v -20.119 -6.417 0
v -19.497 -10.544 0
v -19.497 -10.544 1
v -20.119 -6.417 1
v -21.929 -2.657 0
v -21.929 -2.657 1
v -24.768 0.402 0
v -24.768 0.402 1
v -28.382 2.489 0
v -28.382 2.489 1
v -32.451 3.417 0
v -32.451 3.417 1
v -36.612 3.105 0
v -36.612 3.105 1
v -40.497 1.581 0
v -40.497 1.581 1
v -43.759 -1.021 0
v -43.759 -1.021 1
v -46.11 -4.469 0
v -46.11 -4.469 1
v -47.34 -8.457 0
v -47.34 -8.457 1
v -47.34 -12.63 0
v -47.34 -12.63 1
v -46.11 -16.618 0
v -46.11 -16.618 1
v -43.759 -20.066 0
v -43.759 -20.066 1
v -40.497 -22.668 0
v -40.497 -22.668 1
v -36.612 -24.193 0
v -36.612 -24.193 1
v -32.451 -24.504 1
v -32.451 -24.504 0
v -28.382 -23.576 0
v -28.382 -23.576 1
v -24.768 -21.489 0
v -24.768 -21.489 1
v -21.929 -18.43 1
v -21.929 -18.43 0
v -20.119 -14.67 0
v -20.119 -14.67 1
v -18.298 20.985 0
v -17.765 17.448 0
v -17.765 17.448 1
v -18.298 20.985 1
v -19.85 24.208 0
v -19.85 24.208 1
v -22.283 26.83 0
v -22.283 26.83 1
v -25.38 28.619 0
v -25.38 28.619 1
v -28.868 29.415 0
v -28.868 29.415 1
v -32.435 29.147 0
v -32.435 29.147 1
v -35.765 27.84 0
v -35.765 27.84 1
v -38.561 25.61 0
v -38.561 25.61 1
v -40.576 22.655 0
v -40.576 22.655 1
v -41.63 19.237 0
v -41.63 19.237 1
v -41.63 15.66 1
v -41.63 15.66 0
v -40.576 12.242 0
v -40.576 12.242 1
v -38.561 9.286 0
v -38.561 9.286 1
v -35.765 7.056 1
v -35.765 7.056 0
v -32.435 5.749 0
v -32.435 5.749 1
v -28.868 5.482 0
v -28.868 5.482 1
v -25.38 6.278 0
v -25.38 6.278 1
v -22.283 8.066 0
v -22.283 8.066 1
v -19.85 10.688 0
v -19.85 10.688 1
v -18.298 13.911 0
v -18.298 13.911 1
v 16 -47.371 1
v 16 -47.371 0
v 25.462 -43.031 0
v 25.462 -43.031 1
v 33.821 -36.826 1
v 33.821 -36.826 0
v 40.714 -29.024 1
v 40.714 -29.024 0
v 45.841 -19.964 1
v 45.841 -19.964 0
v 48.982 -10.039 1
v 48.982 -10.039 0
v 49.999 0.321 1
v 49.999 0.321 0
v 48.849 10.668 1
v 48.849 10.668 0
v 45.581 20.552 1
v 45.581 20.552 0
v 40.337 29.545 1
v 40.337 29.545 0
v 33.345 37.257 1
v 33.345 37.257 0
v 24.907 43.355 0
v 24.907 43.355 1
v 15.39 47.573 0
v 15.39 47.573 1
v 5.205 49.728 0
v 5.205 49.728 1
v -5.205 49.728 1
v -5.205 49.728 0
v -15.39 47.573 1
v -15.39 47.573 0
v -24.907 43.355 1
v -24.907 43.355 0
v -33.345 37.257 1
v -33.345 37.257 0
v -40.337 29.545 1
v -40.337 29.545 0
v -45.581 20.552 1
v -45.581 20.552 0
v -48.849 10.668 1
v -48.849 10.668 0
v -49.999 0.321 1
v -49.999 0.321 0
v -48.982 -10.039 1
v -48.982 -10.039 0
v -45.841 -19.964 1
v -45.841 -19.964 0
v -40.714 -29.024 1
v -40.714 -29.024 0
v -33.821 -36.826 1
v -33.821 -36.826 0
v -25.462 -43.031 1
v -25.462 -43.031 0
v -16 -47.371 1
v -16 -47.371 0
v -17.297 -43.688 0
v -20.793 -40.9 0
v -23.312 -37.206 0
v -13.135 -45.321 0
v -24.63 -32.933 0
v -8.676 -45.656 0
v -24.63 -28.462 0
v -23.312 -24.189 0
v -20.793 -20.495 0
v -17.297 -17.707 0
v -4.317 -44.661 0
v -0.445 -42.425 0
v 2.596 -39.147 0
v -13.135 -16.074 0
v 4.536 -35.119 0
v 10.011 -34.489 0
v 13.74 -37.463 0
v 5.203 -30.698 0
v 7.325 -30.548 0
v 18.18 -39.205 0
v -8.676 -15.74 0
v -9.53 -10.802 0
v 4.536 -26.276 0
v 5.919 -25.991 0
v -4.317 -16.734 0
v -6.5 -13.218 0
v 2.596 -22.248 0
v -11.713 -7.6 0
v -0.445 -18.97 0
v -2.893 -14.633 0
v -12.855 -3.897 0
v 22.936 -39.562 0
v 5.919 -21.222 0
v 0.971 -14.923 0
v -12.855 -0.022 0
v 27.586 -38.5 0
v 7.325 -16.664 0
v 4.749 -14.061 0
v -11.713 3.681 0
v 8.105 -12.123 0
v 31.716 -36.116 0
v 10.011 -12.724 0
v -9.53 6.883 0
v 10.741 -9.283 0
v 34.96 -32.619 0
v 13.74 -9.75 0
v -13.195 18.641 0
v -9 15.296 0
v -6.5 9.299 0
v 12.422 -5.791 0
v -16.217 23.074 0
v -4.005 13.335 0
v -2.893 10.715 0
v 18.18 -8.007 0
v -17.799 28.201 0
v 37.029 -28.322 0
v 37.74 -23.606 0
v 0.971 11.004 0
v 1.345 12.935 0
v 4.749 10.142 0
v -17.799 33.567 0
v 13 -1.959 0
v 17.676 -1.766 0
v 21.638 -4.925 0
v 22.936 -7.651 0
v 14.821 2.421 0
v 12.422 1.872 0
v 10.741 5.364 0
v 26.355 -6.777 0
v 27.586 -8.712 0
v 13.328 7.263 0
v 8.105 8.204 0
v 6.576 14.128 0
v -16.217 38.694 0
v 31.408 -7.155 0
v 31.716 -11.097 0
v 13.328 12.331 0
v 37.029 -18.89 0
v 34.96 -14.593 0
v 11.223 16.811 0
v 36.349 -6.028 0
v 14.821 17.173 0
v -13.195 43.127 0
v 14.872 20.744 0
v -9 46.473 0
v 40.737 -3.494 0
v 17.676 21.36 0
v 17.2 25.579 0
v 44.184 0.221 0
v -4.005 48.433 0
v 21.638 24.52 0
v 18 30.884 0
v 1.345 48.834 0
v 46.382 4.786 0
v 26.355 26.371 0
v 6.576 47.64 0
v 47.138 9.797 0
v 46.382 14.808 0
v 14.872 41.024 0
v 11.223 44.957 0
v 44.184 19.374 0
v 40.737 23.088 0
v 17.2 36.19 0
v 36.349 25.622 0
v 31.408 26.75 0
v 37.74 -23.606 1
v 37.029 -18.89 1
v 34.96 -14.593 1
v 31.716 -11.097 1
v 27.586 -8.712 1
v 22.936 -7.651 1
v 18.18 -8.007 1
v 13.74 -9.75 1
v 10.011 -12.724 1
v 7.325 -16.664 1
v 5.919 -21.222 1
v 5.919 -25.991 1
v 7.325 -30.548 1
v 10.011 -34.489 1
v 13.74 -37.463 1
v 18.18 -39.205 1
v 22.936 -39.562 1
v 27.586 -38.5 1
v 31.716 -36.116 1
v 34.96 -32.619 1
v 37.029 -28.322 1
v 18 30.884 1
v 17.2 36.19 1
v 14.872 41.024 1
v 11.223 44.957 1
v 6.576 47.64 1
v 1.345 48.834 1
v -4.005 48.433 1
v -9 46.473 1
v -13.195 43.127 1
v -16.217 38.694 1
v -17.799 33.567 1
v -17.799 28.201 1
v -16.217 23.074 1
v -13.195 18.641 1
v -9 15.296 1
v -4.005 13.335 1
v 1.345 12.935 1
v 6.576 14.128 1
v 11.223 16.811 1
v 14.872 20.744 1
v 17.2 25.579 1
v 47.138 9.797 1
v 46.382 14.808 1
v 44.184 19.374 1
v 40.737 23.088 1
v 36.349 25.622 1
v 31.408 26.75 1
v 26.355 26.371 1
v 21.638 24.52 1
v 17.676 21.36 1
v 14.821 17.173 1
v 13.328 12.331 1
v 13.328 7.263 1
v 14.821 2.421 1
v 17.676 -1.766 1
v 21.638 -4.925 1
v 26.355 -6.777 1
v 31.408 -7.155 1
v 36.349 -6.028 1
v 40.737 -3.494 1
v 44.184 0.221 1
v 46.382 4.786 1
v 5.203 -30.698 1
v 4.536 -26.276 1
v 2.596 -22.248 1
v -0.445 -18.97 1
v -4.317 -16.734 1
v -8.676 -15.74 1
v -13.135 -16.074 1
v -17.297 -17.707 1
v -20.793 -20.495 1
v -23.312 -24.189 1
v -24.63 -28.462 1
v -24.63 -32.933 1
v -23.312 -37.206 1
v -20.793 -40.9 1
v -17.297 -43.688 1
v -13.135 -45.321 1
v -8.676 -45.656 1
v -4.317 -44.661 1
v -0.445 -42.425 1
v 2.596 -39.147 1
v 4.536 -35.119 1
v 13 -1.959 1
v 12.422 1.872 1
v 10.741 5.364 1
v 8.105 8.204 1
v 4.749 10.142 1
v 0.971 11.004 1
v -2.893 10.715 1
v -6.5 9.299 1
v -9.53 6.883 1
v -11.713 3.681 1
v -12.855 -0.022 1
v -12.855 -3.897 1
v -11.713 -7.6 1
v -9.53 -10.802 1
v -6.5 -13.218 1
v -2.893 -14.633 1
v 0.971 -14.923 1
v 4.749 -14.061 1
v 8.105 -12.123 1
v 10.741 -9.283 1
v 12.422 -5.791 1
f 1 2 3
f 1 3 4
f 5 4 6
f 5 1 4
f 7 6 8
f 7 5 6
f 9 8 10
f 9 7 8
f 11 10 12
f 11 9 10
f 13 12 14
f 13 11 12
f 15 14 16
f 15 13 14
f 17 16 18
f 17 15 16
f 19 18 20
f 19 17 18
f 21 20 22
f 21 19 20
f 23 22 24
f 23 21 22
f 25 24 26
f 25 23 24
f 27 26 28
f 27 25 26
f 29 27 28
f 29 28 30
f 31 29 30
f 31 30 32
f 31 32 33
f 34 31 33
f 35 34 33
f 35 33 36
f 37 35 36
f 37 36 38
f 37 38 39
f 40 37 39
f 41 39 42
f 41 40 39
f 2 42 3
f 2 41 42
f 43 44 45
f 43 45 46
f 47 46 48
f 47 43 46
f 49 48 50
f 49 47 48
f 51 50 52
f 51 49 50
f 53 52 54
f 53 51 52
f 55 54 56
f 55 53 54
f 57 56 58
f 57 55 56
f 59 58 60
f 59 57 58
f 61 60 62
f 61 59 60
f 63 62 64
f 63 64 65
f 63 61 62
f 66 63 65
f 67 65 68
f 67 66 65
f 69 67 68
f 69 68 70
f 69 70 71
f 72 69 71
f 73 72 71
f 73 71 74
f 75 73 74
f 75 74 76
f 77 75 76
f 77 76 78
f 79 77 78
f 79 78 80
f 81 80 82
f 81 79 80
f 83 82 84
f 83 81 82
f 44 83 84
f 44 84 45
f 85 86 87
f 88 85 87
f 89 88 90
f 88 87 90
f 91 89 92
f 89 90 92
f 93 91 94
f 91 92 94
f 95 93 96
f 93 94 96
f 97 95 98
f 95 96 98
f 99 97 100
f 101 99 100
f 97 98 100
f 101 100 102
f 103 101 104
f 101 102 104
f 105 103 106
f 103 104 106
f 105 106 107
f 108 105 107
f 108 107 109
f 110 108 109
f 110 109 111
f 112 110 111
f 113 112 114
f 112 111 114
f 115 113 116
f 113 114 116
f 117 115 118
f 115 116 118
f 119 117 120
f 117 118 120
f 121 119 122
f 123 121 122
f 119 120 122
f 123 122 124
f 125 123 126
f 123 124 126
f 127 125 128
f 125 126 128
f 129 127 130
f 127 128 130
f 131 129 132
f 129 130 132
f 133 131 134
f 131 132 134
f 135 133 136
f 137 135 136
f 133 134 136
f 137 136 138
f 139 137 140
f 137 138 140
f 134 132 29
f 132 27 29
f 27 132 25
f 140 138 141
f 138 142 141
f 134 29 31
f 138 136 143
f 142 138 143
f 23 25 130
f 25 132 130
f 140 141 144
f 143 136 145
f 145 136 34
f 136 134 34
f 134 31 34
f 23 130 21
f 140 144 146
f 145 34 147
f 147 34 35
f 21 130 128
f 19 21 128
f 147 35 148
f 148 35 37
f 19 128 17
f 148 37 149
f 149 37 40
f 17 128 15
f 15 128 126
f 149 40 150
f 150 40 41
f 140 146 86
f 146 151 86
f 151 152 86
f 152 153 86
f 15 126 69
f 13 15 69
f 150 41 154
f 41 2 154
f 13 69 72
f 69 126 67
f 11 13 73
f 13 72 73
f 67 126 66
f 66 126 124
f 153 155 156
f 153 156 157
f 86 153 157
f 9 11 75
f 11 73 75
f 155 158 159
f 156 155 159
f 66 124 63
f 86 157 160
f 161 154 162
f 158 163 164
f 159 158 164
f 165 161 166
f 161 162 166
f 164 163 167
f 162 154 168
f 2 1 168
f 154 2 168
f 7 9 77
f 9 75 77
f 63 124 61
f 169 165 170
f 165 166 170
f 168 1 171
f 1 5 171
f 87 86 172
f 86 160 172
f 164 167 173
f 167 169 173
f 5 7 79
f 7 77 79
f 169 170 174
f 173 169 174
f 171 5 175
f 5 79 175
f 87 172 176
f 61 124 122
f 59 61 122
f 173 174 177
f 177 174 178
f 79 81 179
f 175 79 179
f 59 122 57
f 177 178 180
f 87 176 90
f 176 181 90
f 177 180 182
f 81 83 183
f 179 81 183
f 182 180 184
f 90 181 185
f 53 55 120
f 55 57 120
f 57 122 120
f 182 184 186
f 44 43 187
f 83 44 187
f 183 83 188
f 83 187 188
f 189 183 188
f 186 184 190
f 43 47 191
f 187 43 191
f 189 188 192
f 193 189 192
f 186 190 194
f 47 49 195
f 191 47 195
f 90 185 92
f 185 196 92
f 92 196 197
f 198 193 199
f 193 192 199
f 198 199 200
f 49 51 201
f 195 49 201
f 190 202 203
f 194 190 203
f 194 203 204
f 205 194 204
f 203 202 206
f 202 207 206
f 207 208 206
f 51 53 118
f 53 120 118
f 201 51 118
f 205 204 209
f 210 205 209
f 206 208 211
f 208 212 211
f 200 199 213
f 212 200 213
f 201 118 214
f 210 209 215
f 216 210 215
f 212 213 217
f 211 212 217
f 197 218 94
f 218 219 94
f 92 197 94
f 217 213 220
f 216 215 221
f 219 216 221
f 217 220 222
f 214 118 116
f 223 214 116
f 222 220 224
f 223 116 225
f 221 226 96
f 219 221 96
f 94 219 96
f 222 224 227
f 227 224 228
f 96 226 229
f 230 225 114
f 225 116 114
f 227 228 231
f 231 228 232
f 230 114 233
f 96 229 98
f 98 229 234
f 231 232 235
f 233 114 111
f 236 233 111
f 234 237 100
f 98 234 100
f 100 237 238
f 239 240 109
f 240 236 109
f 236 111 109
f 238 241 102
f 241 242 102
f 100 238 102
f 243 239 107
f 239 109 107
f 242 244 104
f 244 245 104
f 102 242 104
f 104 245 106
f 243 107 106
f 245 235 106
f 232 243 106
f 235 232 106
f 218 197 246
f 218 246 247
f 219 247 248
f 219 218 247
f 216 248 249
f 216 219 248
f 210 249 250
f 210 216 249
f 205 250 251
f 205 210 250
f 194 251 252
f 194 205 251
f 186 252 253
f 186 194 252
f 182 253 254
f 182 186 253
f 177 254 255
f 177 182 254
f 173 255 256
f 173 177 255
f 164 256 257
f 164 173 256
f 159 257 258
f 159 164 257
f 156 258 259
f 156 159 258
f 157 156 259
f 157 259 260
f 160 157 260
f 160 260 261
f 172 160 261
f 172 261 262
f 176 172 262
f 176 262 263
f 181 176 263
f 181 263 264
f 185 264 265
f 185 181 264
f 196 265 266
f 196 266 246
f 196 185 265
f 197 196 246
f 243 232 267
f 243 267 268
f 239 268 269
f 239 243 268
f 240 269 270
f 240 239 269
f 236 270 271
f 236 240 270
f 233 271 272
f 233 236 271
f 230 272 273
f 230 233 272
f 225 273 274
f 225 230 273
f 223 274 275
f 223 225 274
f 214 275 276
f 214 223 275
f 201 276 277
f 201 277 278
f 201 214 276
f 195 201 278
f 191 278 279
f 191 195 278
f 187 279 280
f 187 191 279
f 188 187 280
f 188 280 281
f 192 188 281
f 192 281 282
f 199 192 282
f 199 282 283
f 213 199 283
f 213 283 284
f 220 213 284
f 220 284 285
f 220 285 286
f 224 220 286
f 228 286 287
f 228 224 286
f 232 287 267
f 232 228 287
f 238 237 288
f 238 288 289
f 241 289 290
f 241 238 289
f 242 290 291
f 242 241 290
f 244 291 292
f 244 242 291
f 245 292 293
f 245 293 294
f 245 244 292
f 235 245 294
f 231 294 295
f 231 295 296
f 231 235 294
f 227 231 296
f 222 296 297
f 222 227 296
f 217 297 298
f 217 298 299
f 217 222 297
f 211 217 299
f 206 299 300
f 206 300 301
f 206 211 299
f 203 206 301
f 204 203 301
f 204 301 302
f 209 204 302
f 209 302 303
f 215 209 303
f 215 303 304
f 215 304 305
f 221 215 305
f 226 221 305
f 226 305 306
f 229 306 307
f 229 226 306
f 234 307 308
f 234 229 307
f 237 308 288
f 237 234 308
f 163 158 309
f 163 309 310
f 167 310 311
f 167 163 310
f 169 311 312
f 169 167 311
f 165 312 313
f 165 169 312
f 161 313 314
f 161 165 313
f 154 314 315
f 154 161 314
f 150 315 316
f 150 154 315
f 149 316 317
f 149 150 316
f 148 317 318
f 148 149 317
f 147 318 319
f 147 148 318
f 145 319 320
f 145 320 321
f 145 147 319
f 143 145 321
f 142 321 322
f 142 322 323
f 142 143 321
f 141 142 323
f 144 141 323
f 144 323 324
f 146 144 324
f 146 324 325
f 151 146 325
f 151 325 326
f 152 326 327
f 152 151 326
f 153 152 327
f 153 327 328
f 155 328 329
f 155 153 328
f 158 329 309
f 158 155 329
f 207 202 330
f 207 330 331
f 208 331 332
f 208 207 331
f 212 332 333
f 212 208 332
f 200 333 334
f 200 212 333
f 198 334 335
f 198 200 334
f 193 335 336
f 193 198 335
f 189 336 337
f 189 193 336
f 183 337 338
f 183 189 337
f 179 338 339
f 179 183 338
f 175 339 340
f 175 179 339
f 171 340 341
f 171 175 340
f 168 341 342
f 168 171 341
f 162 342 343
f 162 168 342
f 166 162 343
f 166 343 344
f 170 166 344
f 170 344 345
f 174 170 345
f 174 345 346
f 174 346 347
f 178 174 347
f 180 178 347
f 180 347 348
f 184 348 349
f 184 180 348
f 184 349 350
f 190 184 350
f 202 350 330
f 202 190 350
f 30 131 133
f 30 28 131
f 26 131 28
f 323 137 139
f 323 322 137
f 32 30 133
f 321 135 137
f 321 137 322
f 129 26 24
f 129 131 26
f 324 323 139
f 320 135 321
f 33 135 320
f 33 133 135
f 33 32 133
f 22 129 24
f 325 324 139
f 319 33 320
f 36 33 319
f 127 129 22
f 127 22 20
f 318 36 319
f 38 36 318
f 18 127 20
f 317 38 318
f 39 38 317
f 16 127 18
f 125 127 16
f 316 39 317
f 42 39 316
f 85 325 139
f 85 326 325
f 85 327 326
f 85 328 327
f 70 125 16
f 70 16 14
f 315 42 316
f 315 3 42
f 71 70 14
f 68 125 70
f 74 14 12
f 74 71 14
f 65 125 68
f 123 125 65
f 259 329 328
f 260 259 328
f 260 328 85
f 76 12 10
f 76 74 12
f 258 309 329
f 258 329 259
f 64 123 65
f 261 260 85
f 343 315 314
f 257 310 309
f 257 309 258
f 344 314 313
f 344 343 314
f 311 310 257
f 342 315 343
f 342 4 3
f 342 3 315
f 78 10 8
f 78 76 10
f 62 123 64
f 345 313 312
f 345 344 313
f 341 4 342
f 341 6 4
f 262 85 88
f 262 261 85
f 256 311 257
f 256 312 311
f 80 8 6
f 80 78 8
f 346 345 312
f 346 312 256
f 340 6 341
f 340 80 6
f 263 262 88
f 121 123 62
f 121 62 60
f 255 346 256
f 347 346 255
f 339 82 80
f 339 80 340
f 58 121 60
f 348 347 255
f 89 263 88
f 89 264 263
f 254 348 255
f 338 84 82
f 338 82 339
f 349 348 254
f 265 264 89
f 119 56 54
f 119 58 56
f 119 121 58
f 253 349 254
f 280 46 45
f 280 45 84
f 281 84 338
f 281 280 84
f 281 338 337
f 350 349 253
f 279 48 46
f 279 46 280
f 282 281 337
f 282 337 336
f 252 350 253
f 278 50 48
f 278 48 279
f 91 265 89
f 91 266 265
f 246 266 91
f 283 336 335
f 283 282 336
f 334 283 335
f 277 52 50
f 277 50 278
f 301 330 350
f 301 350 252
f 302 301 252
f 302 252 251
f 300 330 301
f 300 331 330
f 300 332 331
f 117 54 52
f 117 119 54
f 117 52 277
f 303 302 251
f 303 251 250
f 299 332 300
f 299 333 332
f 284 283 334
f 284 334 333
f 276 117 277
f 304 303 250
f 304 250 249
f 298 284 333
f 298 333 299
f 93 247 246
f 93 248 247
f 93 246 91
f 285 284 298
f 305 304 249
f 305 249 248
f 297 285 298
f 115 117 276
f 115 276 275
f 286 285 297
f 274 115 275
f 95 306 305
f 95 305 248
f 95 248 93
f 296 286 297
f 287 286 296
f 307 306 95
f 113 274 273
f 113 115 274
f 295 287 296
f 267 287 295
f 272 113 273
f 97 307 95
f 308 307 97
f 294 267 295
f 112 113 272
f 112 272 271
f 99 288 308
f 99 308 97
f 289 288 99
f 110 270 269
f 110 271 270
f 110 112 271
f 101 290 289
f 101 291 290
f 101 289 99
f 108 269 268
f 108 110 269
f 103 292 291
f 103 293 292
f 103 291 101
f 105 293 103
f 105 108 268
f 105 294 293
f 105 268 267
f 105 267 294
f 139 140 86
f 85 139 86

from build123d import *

# Parameters (mm, degrees)
F0_R     = 15
F0_R_2   = 14
F0_R_3   = 13
F0_R_4   = 16
F0_R_5   = 12
F0_R_6   = 18
F0_R_7   = 17
F1_DEPTH = 1


with BuildPart() as f1:
    # F0 (on Top) → F1 (new body)
    with BuildSketch(Plane.XY):
        with BuildLine():
            Line((-16, -47.370877), (16, -47.370877))
            ThreePointArc((16, -47.370877), (0, 50), (-16, -47.370877))
        make_face()
        with Locations((-9.797097, -30.697571)):
            Circle(F0_R, mode=Mode.SUBTRACT)
        with Locations((-33.496745, -10.543544)):
            Circle(F0_R_2, mode=Mode.SUBTRACT)
        with Locations((0, -1.95942)):
            Circle(F0_R_3, mode=Mode.SUBTRACT)
        with Locations((21.740226, -23.606339)):
            Circle(F0_R_4, mode=Mode.SUBTRACT)
        with Locations((-29.764516, 17.448165)):
            Circle(F0_R_5, mode=Mode.SUBTRACT)
        with Locations((0, 30.884182)):
            Circle(F0_R_6, mode=Mode.SUBTRACT)
        with Locations((30.137738, 9.797097)):
            Circle(F0_R_7, mode=Mode.SUBTRACT)
    extrude(amount=F1_DEPTH)


solid = f1.part
